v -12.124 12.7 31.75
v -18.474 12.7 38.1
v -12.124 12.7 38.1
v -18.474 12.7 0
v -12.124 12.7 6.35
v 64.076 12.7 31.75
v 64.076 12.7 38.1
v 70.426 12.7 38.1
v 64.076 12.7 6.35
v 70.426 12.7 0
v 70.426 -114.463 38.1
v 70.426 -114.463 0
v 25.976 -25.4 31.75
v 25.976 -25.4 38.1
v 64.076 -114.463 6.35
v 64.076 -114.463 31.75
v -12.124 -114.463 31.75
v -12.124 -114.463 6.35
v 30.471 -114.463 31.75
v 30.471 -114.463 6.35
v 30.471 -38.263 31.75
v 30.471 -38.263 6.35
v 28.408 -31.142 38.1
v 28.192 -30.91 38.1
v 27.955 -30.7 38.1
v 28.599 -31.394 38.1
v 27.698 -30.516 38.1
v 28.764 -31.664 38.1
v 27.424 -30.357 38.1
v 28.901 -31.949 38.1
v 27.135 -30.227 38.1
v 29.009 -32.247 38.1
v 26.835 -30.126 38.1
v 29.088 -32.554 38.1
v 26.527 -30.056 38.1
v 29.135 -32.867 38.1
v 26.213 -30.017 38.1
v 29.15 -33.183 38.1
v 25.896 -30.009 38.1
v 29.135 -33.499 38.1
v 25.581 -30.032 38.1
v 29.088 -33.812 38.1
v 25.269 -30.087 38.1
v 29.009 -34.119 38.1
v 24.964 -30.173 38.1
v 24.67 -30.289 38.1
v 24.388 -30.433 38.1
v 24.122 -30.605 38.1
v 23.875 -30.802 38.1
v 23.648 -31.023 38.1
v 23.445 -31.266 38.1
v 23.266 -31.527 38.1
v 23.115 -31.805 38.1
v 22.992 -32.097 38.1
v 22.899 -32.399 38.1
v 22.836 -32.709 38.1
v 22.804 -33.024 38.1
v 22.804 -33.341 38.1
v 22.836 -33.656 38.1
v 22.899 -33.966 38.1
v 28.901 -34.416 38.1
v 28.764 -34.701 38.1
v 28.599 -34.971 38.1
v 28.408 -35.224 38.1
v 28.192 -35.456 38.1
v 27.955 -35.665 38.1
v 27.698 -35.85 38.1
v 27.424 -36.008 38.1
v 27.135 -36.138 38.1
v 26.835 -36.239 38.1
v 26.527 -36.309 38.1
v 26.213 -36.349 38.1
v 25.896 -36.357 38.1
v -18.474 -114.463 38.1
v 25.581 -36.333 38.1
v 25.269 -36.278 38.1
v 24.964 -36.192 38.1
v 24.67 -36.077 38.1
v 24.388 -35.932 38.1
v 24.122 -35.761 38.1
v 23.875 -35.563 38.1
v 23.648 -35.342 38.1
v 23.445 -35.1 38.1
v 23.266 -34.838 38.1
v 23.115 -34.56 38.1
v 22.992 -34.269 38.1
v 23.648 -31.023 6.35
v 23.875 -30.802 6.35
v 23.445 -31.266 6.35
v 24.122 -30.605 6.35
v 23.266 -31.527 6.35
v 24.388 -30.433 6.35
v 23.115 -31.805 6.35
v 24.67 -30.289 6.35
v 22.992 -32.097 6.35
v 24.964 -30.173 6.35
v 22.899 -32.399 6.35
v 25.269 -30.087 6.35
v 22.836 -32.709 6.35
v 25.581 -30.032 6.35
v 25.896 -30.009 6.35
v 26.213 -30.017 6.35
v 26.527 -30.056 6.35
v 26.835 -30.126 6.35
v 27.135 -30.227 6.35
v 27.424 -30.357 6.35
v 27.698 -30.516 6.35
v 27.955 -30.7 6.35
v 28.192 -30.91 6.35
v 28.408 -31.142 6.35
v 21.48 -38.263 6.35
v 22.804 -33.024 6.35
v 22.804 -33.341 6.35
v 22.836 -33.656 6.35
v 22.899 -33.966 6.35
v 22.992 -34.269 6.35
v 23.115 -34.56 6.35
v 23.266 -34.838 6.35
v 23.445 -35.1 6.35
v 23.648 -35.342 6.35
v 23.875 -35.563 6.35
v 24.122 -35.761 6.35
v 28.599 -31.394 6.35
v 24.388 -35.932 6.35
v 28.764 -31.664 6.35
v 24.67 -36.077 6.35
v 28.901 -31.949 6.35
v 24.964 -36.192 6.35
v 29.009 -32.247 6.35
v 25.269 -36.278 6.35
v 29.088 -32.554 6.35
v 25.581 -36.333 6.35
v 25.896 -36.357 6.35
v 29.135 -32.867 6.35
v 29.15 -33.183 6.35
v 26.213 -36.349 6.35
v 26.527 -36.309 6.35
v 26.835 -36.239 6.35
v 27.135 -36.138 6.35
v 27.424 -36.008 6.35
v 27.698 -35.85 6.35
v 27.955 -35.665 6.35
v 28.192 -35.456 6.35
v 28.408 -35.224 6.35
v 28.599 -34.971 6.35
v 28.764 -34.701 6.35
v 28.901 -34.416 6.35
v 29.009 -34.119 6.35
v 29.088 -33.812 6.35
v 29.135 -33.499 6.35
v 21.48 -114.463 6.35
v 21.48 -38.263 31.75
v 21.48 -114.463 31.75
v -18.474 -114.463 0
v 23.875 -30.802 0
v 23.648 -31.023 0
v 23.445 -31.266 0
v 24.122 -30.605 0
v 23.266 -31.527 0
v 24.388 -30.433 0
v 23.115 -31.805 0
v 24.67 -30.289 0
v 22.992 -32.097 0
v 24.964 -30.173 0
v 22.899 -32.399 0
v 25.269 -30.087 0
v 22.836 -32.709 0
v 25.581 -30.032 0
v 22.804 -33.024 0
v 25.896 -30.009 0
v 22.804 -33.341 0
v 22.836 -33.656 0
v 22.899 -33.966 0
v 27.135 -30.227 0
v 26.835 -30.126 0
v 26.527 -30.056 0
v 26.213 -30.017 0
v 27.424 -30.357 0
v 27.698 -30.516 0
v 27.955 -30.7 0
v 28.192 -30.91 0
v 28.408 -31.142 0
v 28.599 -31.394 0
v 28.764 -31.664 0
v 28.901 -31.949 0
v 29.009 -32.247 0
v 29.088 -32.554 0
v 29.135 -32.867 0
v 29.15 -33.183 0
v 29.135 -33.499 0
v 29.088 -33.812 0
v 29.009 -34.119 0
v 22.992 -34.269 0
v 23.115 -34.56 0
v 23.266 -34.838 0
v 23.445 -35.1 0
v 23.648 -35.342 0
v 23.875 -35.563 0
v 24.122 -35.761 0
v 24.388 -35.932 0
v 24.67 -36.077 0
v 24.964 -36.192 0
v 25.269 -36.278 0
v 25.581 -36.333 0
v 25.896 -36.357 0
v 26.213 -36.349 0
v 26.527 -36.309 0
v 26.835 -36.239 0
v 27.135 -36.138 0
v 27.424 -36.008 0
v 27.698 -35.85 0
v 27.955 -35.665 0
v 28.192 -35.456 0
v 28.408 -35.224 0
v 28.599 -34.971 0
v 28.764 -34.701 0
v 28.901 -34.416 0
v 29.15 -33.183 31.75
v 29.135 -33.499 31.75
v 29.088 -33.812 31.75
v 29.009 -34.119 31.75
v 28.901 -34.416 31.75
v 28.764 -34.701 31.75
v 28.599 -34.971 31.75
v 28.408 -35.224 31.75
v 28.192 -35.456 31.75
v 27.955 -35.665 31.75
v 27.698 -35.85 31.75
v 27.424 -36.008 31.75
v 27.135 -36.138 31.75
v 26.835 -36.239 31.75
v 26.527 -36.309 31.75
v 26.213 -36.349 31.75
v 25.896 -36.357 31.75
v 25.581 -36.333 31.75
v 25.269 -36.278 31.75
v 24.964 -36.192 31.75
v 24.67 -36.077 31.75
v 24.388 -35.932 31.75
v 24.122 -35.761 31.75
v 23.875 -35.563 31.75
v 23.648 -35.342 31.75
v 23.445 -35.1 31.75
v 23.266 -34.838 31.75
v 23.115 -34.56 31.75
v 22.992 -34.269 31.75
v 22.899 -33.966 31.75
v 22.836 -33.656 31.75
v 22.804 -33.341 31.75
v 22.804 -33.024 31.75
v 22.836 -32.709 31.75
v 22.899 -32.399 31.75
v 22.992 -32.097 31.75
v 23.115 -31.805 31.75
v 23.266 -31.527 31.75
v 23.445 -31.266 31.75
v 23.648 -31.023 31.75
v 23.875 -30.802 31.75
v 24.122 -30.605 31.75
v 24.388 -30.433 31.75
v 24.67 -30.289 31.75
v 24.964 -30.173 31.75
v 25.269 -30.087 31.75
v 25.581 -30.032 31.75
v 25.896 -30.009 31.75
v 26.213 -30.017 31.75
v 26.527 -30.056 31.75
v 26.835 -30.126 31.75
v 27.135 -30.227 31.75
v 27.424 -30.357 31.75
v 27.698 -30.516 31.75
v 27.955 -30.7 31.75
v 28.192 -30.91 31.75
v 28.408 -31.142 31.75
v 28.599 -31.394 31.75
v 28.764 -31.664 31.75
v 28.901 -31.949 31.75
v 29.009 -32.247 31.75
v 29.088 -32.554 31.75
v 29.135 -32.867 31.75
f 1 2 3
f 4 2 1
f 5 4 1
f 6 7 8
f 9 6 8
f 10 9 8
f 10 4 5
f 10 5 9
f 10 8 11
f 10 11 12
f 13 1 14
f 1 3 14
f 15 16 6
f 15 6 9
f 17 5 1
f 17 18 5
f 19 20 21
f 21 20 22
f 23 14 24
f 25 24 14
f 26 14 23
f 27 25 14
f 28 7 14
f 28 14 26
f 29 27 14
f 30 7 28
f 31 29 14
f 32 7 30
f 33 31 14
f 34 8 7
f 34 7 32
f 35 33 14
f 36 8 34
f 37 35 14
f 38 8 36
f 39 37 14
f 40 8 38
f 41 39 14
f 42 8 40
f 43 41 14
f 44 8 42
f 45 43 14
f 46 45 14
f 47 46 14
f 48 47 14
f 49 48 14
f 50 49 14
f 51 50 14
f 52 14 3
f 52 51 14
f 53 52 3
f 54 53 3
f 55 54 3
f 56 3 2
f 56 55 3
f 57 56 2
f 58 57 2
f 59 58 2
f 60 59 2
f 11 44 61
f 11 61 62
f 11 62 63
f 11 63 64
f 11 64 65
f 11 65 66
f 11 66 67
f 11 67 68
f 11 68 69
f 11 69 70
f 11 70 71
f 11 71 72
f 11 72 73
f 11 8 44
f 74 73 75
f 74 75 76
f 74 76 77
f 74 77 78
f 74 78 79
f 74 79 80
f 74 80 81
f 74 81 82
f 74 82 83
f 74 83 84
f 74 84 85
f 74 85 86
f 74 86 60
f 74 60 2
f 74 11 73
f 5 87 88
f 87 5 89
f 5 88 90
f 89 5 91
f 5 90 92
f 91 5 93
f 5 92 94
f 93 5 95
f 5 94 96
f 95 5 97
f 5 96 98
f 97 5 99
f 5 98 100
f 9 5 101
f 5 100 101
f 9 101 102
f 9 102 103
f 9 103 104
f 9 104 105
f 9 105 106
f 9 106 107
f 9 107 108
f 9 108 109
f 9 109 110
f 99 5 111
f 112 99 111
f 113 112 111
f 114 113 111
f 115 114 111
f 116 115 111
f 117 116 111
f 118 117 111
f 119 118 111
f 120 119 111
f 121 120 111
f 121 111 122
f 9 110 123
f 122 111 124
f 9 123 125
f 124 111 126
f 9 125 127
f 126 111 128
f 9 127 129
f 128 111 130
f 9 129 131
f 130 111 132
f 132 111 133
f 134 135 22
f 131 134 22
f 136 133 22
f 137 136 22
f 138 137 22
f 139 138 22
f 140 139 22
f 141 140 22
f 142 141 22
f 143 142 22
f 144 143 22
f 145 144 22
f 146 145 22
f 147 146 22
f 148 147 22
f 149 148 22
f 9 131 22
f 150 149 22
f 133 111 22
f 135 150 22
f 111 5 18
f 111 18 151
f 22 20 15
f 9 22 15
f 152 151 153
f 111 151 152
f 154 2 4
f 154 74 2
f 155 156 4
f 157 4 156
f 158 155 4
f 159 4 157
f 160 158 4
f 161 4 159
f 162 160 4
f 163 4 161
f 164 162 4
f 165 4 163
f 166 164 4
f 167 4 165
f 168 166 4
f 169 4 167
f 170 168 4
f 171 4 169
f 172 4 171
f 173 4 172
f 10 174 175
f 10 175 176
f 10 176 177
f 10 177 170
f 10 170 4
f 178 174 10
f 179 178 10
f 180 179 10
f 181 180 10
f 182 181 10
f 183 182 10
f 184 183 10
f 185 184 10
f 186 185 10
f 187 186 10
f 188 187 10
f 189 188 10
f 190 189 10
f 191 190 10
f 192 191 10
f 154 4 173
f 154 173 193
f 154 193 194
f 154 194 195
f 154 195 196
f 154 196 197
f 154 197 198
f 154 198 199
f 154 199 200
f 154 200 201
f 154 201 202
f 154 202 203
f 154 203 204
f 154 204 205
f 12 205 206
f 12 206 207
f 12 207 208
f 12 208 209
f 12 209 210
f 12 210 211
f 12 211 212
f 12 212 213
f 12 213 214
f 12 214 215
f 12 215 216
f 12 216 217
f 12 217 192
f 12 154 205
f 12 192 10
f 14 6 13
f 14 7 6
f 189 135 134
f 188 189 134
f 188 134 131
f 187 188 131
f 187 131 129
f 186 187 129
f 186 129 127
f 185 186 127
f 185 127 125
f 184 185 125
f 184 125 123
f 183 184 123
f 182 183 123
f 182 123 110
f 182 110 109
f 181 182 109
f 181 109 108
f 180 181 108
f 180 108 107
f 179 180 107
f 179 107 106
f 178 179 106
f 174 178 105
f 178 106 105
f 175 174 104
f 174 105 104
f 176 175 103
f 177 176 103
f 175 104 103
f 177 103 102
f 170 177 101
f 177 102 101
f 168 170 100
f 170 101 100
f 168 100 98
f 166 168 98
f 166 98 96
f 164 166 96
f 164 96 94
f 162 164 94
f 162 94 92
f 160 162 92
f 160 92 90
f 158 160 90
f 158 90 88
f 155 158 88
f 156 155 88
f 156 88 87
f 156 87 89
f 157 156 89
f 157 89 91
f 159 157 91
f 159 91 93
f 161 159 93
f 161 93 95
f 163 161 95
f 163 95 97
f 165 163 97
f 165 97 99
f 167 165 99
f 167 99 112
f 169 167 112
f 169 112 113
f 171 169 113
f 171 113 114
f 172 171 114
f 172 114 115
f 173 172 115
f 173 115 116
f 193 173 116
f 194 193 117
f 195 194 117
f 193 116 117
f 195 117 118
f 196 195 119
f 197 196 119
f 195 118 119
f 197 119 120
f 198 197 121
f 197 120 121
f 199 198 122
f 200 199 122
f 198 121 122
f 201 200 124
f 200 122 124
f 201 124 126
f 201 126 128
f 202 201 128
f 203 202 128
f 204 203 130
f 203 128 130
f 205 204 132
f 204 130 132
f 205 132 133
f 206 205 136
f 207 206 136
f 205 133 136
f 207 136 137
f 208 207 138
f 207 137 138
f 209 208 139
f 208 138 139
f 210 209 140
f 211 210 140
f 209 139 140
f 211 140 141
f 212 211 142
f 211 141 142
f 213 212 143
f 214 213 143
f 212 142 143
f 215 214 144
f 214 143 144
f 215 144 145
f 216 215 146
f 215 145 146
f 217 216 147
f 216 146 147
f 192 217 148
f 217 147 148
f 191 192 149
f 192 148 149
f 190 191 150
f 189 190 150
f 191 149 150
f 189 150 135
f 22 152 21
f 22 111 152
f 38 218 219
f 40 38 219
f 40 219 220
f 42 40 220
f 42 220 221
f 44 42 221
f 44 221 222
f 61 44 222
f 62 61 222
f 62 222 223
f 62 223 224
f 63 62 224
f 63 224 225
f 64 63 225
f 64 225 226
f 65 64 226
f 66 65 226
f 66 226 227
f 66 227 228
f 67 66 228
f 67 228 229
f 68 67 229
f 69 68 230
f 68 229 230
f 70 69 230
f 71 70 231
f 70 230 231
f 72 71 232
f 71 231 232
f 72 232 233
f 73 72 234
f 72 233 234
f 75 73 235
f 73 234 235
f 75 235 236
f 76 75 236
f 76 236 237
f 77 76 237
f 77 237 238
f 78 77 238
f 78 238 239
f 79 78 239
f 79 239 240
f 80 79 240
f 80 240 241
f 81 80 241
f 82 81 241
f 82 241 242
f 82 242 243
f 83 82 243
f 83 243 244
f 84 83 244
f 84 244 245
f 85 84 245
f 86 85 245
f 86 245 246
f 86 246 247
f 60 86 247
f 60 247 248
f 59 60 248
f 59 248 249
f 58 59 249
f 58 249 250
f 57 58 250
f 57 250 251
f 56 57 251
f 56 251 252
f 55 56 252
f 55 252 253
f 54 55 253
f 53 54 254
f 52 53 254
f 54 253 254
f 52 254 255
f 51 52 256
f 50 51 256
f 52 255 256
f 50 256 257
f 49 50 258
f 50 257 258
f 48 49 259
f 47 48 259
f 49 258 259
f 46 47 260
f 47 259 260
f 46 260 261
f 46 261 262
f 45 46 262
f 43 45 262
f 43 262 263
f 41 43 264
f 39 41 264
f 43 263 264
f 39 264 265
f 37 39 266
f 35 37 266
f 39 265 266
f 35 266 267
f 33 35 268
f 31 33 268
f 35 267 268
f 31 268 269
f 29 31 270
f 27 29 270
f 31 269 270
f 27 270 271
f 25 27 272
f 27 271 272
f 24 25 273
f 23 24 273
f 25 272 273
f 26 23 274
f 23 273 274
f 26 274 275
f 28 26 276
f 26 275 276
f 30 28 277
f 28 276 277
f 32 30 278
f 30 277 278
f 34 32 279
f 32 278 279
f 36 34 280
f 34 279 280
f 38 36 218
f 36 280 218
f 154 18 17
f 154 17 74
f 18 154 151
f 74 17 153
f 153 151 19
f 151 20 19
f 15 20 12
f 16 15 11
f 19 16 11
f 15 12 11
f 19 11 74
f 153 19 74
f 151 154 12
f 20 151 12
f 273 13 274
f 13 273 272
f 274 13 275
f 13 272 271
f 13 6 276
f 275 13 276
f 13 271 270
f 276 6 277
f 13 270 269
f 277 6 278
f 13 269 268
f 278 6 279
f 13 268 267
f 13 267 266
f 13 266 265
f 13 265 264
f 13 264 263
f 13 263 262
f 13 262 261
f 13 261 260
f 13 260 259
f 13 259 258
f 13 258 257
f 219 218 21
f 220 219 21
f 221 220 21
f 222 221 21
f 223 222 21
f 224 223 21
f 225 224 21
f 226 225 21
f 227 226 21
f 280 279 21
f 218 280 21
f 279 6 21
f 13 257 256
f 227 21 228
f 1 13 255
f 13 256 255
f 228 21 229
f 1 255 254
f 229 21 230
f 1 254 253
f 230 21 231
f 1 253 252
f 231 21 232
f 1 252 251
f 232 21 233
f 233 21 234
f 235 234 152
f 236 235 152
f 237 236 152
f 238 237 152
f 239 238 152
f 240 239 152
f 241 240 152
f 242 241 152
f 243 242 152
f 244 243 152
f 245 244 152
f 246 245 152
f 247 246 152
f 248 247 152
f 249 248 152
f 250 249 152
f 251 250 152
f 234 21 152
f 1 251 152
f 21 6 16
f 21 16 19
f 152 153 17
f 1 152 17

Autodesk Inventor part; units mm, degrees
ref_plane "YZ Plane" through (0, 0, 0) normal (1, 0, 0) x (0, 1, 0)
ref_plane "XZ Plane" through (0, 0, 0) normal (0, 1, 0) x (-1, 0, 0)
ref_plane "XY Plane" through (0, 0, 0) normal (0, 0, 1) x (1, 0, 0)
sketch "Sketch1" plane through (0, 0, 0) normal (0, 0, 1) x (1, 0, 0)
  line L0 (-12.1245, 12.5373) -> (64.0755, 12.5373)
  line L1 (64.0755, 12.5373) -> (64.0755, -114.4627)
  line L2 (64.0755, -114.4627) -> (-12.1245, -114.4627)
  line L3 (-12.1245, -114.4627) -> (-12.1245, 12.5373)
  point P0 (0, 0)
  dimension "d0" = 76.2
  dimension "d1" = 127
extrude "Extrusion1" add sketch "Sketch1" along normal blind 6.35
sketch "Sketch2" plane through (0, 0, 6.35) normal (0, 0, 1) x (1, 0, 0)
  line L0 (-12.1245, -114.4627) -> (64.0755, -114.4627) projected
  line L1 (25.9755, -114.4627) -> (25.9755, 12.062) construction
  line L2 (21.4802, -114.4627) -> (21.4802, -38.2627)
  line L3 (30.4708, -114.4627) -> (30.4708, -38.2627)
  line L4 (21.4802, -38.2627) -> (30.4708, -38.2627)
  line L5 (21.4802, -114.4627) -> (30.4708, -114.4627)
  point P0 (0, 0)
  dimension "d4" = 76.2
extrude "Extrusion2" add sketch "Sketch2" along normal blind 25.4
sketch "Sketch3" plane through (0, 0, 31.75) normal (0, 0, 1) x (1, 0, 0)
  line L0 (64.0755, -114.4627) -> (64.0755, 12.5373) projected
  line L1 (-12.1245, -114.4627) -> (64.0755, -114.4627)
  line L2 (64.0755, -114.4627) -> (64.0755, 0)
  line L3 (64.0755, 0) -> (-12.1245, 0)
  line L4 (-12.1245, 0) -> (-12.1245, -114.4627)
  point P0 (0, 0)
extrude "Extrusion3" add sketch "Sketch3" along normal blind 6.35
sketch "Sketch4" plane through (0, 0, 31.75) normal (0, 0, -1) x (-1, 0, 0)
  point P0 (0, 0)
sketch "Sketch5" plane through (0, 0, 6.35) normal (0, 0, 1) x (1, 0, 0)
  line L0 (21.4802, -38.2627) -> (30.4708, -38.2627) projected
  line L1 (25.9755, -38.2627) -> (25.9755, -33.1827) construction
  circle A0 centre (25.9755, -33.1827) radius 3.175
  point P0 (0, 0)
  dimension "d9" = 5.08
  dimension "d10" = 6.35
extrude "Extrusion4" cut sketch "Sketch5" along normal mid plane 76.2
sketch "Sketch6" plane through (64.0755, -114.4627, 31.75) normal (1, 0, 0) x (0, 0, -1)
  line L0 (31.75, 127) -> (31.75, 0) projected
  line L1 (-6.35, 114.4627) -> (31.75, 114.4627)
  line L2 (31.75, 114.4627) -> (31.75, 0)
  line L3 (31.75, 0) -> (-6.35, 0)
  line L4 (-6.35, 0) -> (-6.35, 114.4627)
extrude "Extrusion5" add sketch "Sketch6" along normal blind 6.35
sketch "Sketch7" plane through (-12.1245, -114.4627, 31.75) normal (-1, 0, 0) x (0, 0, 1)
  line L0 (0, 114.4627) -> (6.35, 114.4627) projected
  line L1 (-31.75, 0) -> (-25.4, 0) projected
  line L2 (6.35, 114.4627) -> (-31.75, 114.4627)
  line L3 (-31.75, 114.4627) -> (-31.75, 0)
  line L4 (-31.75, 0) -> (6.35, 0)
  line L5 (6.35, 0) -> (6.35, 114.4627)
extrude "Extrusion6" add sketch "Sketch7" along normal blind 6.35
sketch "Sketch8" plane through (64.0755, 0, 31.75) normal (0, 1, 0) x (1, 0, 0)
  line L0 (-82.55, 31.75) -> (6.35, 31.75) projected
  line L1 (0, 0) -> (-76.2, 0) projected
  line L2 (-82.55, 31.75) -> (-76.2, 31.75)
  line L3 (-76.2, 31.75) -> (-76.2, 0)
  line L4 (-82.55, 0) -> (-82.55, 31.75)
  line L5 (6.35, 31.75) -> (6.35, -6.35) projected
  line L6 (-76.2, 0) -> (0, 0)
  line L7 (6.35, 0) -> (6.35, -6.35)
  line L8 (6.35, -6.35) -> (-82.55, -6.35)
  line L9 (-82.55, -6.35) -> (-82.55, 0)
  line L10 (0, 31.75) -> (0, 25.4) projected
  line L11 (0, 0) -> (0, 31.75)
  line L12 (0, 31.75) -> (6.35, 31.75)
  line L13 (6.35, 31.75) -> (6.35, 0)
  point P0 (-64.0755, 31.75)
extrude "Extrusion7" add sketch "Sketch8" along normal blind 12.7 contours L0 L3 L1 L11 L10 L5 L8 L9 L4
sketch "Sketch9" plane through (64.0755, 12.5373, 6.35) normal (0, 1, 0) x (1, 0, 0)
  line L0 (-76.2, 0) -> (-42.5953, 0) projected
  line L1 (-82.55, 6.35) -> (6.35, 6.35) projected
  line L2 (-76.2, 0) -> (0.0054, 0)
  line L3 (0.0054, 0) -> (0.0054, 6.35)
  line L4 (0.0054, 6.35) -> (-76.2, 6.35)
  line L5 (-76.2, 6.35) -> (-76.2, 0)
  point P0 (-64.0755, 6.35)
extrude "Extrusion8" add sketch "Sketch9" along normal up to surface (0.1627 mm away)
sketch "Sketch10" plane through (0, 0, 38.1) normal (0, 0, 1) x (1, 0, 0)
  line L0 (64.0755, 12.7) -> (-12.1245, 12.7) construction
  line L1 (64.0755, -114.4627) -> (64.0755, 12.7) projected
  line L2 (-12.1245, 12.7) -> (64.0755, 12.7) construction
  line L3 (64.0755, 12.7) -> (64.0755, -63.5) construction
  line L4 (64.0755, -63.5) -> (-12.1245, -63.5) construction
  line L5 (-12.1245, -63.5) -> (-12.1245, 12.7) construction
  line L6 (-12.1245, 12.7) -> (25.9755, -25.4)
  line L7 (64.0755, 12.7) -> (25.9755, -25.4)
  line L8 (-12.1245, -114.4627) -> (-12.1245, 12.7) projected
  line L9 (-12.1245, 12.7) -> (64.0755, 12.7)
  point P0 (0, 0)
  dimension "d21" = 76.2
extrude "Extrusion9" cut sketch "Sketch10" against normal blind 25.4
properties part number "ENGR131 KC Design" material "Concrete Masonry Units"
